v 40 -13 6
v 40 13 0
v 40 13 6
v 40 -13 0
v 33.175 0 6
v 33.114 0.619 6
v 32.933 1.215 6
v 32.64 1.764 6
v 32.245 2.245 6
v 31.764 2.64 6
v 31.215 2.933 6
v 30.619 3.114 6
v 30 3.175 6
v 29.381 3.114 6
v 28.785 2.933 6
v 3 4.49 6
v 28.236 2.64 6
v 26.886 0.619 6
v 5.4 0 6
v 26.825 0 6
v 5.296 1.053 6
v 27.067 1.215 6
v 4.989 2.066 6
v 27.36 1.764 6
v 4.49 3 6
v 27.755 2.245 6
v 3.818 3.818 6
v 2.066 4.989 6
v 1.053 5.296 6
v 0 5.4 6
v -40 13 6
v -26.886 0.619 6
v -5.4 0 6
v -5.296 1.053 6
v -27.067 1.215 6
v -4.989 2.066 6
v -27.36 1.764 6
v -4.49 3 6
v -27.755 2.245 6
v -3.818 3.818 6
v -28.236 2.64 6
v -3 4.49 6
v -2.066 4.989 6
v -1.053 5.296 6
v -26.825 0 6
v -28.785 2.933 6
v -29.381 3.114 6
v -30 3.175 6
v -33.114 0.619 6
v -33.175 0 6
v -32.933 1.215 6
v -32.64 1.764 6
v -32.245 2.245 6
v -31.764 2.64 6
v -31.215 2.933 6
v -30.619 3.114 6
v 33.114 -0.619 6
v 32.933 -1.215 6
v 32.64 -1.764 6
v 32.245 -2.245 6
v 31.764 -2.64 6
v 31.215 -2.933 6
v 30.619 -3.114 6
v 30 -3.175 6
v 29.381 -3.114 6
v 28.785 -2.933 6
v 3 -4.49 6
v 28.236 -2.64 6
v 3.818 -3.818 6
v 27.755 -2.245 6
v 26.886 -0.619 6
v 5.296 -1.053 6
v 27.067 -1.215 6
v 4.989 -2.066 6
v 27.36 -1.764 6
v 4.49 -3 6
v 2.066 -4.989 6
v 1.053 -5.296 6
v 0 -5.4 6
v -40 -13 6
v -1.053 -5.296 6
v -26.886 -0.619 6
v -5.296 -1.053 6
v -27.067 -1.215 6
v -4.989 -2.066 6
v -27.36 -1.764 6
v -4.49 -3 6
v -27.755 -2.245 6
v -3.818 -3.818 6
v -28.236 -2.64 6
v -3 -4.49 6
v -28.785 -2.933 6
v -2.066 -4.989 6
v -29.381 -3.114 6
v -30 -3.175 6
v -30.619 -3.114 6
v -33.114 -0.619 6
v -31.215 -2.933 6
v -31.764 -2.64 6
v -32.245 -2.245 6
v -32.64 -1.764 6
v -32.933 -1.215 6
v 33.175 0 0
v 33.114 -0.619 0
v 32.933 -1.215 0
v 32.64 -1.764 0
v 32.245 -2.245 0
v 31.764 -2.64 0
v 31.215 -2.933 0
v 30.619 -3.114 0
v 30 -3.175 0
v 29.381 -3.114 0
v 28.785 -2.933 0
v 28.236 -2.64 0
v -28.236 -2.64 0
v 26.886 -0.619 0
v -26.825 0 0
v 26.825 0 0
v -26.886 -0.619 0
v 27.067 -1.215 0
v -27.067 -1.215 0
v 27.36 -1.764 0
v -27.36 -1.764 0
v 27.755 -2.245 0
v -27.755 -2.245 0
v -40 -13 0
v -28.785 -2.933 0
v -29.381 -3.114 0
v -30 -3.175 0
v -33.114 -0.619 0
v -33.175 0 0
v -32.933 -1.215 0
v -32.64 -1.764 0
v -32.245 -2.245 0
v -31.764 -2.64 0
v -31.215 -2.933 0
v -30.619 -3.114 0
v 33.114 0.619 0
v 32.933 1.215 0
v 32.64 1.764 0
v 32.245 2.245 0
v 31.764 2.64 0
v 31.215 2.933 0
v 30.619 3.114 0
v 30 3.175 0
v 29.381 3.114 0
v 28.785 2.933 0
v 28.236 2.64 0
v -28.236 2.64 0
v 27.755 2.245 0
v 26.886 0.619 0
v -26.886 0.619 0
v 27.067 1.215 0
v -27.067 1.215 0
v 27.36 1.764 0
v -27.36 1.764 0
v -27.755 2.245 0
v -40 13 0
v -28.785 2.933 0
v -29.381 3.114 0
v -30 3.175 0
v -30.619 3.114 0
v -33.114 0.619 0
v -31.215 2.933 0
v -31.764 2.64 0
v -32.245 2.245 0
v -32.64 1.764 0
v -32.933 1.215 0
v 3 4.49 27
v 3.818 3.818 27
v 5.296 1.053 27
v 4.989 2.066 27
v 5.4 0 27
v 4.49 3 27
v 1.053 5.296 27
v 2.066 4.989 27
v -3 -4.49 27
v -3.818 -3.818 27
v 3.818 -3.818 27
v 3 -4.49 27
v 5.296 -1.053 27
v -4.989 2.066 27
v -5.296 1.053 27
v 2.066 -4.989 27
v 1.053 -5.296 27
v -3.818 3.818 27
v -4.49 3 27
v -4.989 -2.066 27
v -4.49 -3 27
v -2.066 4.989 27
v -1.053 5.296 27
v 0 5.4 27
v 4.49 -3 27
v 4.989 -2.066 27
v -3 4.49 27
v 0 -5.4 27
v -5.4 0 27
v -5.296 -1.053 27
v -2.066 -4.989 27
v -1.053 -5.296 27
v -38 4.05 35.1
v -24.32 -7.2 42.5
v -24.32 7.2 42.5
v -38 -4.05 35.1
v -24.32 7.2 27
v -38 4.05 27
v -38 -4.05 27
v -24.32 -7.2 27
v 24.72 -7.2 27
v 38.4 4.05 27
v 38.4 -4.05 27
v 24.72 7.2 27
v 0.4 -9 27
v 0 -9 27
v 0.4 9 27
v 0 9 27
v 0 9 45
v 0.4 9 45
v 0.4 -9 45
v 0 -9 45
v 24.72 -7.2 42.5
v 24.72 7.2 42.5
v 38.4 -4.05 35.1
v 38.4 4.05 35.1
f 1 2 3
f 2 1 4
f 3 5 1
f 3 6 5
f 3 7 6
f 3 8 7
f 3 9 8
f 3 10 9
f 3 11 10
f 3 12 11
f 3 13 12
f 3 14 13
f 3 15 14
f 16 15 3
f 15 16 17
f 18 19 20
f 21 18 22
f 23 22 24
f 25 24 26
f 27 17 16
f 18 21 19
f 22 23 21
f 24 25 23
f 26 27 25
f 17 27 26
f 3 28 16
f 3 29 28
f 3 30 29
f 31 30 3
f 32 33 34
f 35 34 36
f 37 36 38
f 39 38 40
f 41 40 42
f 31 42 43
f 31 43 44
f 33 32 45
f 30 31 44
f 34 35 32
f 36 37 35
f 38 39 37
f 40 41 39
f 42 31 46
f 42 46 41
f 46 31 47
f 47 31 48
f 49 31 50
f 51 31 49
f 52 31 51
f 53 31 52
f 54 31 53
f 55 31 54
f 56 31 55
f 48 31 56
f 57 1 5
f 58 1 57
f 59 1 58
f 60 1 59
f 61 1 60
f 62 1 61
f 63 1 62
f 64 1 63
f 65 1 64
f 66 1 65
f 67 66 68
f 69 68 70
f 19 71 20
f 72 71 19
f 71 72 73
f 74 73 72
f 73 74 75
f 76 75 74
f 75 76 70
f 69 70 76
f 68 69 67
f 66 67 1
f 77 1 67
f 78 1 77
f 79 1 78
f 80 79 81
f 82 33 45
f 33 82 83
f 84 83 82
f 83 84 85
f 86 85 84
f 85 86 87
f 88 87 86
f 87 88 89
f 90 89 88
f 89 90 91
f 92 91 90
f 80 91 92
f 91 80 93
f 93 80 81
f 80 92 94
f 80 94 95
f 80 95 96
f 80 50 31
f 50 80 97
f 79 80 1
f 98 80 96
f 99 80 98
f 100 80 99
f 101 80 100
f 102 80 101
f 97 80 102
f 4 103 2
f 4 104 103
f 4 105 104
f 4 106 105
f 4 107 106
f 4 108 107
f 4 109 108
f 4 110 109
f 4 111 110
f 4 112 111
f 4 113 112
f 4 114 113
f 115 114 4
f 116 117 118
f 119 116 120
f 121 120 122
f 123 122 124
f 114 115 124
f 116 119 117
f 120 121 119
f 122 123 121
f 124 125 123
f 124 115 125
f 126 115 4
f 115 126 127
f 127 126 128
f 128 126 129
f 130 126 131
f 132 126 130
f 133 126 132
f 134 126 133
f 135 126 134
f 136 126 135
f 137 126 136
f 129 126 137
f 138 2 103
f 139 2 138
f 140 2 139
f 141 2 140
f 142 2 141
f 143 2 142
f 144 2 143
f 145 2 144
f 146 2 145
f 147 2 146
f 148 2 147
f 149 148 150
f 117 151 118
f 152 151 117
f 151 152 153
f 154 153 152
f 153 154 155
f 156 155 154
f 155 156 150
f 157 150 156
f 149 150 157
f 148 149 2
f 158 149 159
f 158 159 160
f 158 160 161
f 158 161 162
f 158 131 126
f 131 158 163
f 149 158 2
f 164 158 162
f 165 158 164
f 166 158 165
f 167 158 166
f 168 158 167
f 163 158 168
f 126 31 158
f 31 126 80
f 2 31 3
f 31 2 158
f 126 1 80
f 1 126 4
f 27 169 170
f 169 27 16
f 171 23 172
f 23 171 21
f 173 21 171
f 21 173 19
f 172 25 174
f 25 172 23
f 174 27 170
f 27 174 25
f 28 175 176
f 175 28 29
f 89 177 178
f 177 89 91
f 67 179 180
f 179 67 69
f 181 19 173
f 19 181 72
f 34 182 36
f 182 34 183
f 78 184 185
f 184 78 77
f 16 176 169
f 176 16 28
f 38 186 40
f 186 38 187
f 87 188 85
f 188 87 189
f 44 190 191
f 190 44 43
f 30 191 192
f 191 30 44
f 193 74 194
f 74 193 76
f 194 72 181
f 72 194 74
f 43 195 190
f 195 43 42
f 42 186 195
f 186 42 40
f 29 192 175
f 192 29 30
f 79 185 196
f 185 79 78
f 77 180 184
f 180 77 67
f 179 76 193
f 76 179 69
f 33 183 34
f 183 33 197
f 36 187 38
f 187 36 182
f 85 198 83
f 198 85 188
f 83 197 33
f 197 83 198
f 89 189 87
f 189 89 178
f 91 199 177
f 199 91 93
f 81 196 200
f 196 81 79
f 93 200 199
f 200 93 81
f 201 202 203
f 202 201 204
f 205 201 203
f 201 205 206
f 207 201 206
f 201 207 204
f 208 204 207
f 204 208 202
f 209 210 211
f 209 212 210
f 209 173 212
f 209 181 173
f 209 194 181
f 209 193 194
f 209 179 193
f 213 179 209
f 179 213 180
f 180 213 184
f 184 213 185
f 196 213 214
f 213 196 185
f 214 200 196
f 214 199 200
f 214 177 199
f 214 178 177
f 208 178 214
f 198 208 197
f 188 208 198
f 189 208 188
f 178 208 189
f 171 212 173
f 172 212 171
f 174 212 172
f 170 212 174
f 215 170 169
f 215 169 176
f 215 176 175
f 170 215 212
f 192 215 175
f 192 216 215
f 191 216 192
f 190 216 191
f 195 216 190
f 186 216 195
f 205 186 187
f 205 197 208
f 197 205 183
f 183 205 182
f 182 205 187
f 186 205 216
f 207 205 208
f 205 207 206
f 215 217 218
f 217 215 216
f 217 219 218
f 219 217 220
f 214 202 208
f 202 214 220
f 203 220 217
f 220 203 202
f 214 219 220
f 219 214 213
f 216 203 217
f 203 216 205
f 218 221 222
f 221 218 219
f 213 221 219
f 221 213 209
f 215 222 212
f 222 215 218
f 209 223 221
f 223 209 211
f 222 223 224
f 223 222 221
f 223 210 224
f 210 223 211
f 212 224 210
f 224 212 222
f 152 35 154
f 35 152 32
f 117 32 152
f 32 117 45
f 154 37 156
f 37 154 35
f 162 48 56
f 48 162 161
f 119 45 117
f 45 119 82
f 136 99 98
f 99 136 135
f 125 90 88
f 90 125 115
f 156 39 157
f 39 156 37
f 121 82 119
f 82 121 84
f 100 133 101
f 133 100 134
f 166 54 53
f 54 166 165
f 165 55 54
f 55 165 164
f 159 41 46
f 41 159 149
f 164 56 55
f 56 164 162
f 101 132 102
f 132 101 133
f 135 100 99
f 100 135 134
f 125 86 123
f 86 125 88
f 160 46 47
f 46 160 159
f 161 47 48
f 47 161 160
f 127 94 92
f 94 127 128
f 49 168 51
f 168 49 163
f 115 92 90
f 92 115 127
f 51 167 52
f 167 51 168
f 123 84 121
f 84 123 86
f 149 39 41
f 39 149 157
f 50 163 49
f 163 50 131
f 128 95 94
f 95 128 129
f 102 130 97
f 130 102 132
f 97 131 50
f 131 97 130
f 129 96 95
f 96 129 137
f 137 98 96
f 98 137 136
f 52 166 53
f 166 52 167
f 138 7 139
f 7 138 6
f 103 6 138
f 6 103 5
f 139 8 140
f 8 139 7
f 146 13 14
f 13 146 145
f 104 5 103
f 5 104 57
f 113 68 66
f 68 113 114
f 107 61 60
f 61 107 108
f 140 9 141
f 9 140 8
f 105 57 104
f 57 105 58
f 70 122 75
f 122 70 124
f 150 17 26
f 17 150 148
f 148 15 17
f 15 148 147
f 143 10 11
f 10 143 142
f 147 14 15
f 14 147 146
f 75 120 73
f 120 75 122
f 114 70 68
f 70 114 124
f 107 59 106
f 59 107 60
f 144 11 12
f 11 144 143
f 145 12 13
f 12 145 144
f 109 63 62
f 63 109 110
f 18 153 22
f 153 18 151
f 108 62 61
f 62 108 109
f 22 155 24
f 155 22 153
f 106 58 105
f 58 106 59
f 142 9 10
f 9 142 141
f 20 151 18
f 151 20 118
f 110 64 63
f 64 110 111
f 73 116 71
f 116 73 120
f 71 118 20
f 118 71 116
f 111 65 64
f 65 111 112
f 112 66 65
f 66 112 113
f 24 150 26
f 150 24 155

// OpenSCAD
$fn = 32;

// ----------------------------------------------------------------------
// Boat cleat: 80 mm base, horn 36 mm up
// ----------------------------------------------------------------------

// --- parameters (mm) ---
base_l = 80;              // base length
base_w = 26;              // base width
base_t = 6;               // base thickness
horn_len = 76;            // horn length
horn_d = 18;              // horn diameter at the middle
horn_z = 36;              // horn axis height
end_drop = 10;            // how far the horn tips drop
post_d = 10.8;            // centre post diameter
holes_d = 6.35;           // fixing holes
hole_x = 30;              // fixing hole spacing

difference() {
  union() {
    translate([-40, -13, 0]) cube([base_l, base_w, base_t]);
    /* centre post, sunk 1 mm into the base */
    translate([0, 0, 5]) cylinder(h = 31, d = post_d);
    /* horn: a hull chain of boxes, full in the middle and lighter at the tips */
    hull() {
      translate([-38, -4.05, 27]) cube([0.4, 8.1, 8.1], center = false);
      translate([-24.32, -7.2, 27]) cube([0.4, 14.4, 15.5], center = false);
    }
    hull() {
      translate([-24.32, -7.2, 27]) cube([0.4, 14.4, 15.5], center = false);
      translate([0, -9, 27]) cube([0.4, 18, 18], center = false);
    }
    hull() {
      translate([0, -9, 27]) cube([0.4, 18, 18], center = false);
      translate([24.32, -7.2, 27]) cube([0.4, 14.4, 15.5], center = false);
    }
    hull() {
      translate([24.32, -7.2, 27]) cube([0.4, 14.4, 15.5], center = false);
      translate([38, -4.05, 27]) cube([0.4, 8.1, 8.1], center = false);
    }
  }
  translate([-30, 0, -2.5]) cylinder(h = base_t + 5, d = holes_d);
  translate([30, 0, -2.5]) cylinder(h = base_t + 5, d = holes_d);
}
